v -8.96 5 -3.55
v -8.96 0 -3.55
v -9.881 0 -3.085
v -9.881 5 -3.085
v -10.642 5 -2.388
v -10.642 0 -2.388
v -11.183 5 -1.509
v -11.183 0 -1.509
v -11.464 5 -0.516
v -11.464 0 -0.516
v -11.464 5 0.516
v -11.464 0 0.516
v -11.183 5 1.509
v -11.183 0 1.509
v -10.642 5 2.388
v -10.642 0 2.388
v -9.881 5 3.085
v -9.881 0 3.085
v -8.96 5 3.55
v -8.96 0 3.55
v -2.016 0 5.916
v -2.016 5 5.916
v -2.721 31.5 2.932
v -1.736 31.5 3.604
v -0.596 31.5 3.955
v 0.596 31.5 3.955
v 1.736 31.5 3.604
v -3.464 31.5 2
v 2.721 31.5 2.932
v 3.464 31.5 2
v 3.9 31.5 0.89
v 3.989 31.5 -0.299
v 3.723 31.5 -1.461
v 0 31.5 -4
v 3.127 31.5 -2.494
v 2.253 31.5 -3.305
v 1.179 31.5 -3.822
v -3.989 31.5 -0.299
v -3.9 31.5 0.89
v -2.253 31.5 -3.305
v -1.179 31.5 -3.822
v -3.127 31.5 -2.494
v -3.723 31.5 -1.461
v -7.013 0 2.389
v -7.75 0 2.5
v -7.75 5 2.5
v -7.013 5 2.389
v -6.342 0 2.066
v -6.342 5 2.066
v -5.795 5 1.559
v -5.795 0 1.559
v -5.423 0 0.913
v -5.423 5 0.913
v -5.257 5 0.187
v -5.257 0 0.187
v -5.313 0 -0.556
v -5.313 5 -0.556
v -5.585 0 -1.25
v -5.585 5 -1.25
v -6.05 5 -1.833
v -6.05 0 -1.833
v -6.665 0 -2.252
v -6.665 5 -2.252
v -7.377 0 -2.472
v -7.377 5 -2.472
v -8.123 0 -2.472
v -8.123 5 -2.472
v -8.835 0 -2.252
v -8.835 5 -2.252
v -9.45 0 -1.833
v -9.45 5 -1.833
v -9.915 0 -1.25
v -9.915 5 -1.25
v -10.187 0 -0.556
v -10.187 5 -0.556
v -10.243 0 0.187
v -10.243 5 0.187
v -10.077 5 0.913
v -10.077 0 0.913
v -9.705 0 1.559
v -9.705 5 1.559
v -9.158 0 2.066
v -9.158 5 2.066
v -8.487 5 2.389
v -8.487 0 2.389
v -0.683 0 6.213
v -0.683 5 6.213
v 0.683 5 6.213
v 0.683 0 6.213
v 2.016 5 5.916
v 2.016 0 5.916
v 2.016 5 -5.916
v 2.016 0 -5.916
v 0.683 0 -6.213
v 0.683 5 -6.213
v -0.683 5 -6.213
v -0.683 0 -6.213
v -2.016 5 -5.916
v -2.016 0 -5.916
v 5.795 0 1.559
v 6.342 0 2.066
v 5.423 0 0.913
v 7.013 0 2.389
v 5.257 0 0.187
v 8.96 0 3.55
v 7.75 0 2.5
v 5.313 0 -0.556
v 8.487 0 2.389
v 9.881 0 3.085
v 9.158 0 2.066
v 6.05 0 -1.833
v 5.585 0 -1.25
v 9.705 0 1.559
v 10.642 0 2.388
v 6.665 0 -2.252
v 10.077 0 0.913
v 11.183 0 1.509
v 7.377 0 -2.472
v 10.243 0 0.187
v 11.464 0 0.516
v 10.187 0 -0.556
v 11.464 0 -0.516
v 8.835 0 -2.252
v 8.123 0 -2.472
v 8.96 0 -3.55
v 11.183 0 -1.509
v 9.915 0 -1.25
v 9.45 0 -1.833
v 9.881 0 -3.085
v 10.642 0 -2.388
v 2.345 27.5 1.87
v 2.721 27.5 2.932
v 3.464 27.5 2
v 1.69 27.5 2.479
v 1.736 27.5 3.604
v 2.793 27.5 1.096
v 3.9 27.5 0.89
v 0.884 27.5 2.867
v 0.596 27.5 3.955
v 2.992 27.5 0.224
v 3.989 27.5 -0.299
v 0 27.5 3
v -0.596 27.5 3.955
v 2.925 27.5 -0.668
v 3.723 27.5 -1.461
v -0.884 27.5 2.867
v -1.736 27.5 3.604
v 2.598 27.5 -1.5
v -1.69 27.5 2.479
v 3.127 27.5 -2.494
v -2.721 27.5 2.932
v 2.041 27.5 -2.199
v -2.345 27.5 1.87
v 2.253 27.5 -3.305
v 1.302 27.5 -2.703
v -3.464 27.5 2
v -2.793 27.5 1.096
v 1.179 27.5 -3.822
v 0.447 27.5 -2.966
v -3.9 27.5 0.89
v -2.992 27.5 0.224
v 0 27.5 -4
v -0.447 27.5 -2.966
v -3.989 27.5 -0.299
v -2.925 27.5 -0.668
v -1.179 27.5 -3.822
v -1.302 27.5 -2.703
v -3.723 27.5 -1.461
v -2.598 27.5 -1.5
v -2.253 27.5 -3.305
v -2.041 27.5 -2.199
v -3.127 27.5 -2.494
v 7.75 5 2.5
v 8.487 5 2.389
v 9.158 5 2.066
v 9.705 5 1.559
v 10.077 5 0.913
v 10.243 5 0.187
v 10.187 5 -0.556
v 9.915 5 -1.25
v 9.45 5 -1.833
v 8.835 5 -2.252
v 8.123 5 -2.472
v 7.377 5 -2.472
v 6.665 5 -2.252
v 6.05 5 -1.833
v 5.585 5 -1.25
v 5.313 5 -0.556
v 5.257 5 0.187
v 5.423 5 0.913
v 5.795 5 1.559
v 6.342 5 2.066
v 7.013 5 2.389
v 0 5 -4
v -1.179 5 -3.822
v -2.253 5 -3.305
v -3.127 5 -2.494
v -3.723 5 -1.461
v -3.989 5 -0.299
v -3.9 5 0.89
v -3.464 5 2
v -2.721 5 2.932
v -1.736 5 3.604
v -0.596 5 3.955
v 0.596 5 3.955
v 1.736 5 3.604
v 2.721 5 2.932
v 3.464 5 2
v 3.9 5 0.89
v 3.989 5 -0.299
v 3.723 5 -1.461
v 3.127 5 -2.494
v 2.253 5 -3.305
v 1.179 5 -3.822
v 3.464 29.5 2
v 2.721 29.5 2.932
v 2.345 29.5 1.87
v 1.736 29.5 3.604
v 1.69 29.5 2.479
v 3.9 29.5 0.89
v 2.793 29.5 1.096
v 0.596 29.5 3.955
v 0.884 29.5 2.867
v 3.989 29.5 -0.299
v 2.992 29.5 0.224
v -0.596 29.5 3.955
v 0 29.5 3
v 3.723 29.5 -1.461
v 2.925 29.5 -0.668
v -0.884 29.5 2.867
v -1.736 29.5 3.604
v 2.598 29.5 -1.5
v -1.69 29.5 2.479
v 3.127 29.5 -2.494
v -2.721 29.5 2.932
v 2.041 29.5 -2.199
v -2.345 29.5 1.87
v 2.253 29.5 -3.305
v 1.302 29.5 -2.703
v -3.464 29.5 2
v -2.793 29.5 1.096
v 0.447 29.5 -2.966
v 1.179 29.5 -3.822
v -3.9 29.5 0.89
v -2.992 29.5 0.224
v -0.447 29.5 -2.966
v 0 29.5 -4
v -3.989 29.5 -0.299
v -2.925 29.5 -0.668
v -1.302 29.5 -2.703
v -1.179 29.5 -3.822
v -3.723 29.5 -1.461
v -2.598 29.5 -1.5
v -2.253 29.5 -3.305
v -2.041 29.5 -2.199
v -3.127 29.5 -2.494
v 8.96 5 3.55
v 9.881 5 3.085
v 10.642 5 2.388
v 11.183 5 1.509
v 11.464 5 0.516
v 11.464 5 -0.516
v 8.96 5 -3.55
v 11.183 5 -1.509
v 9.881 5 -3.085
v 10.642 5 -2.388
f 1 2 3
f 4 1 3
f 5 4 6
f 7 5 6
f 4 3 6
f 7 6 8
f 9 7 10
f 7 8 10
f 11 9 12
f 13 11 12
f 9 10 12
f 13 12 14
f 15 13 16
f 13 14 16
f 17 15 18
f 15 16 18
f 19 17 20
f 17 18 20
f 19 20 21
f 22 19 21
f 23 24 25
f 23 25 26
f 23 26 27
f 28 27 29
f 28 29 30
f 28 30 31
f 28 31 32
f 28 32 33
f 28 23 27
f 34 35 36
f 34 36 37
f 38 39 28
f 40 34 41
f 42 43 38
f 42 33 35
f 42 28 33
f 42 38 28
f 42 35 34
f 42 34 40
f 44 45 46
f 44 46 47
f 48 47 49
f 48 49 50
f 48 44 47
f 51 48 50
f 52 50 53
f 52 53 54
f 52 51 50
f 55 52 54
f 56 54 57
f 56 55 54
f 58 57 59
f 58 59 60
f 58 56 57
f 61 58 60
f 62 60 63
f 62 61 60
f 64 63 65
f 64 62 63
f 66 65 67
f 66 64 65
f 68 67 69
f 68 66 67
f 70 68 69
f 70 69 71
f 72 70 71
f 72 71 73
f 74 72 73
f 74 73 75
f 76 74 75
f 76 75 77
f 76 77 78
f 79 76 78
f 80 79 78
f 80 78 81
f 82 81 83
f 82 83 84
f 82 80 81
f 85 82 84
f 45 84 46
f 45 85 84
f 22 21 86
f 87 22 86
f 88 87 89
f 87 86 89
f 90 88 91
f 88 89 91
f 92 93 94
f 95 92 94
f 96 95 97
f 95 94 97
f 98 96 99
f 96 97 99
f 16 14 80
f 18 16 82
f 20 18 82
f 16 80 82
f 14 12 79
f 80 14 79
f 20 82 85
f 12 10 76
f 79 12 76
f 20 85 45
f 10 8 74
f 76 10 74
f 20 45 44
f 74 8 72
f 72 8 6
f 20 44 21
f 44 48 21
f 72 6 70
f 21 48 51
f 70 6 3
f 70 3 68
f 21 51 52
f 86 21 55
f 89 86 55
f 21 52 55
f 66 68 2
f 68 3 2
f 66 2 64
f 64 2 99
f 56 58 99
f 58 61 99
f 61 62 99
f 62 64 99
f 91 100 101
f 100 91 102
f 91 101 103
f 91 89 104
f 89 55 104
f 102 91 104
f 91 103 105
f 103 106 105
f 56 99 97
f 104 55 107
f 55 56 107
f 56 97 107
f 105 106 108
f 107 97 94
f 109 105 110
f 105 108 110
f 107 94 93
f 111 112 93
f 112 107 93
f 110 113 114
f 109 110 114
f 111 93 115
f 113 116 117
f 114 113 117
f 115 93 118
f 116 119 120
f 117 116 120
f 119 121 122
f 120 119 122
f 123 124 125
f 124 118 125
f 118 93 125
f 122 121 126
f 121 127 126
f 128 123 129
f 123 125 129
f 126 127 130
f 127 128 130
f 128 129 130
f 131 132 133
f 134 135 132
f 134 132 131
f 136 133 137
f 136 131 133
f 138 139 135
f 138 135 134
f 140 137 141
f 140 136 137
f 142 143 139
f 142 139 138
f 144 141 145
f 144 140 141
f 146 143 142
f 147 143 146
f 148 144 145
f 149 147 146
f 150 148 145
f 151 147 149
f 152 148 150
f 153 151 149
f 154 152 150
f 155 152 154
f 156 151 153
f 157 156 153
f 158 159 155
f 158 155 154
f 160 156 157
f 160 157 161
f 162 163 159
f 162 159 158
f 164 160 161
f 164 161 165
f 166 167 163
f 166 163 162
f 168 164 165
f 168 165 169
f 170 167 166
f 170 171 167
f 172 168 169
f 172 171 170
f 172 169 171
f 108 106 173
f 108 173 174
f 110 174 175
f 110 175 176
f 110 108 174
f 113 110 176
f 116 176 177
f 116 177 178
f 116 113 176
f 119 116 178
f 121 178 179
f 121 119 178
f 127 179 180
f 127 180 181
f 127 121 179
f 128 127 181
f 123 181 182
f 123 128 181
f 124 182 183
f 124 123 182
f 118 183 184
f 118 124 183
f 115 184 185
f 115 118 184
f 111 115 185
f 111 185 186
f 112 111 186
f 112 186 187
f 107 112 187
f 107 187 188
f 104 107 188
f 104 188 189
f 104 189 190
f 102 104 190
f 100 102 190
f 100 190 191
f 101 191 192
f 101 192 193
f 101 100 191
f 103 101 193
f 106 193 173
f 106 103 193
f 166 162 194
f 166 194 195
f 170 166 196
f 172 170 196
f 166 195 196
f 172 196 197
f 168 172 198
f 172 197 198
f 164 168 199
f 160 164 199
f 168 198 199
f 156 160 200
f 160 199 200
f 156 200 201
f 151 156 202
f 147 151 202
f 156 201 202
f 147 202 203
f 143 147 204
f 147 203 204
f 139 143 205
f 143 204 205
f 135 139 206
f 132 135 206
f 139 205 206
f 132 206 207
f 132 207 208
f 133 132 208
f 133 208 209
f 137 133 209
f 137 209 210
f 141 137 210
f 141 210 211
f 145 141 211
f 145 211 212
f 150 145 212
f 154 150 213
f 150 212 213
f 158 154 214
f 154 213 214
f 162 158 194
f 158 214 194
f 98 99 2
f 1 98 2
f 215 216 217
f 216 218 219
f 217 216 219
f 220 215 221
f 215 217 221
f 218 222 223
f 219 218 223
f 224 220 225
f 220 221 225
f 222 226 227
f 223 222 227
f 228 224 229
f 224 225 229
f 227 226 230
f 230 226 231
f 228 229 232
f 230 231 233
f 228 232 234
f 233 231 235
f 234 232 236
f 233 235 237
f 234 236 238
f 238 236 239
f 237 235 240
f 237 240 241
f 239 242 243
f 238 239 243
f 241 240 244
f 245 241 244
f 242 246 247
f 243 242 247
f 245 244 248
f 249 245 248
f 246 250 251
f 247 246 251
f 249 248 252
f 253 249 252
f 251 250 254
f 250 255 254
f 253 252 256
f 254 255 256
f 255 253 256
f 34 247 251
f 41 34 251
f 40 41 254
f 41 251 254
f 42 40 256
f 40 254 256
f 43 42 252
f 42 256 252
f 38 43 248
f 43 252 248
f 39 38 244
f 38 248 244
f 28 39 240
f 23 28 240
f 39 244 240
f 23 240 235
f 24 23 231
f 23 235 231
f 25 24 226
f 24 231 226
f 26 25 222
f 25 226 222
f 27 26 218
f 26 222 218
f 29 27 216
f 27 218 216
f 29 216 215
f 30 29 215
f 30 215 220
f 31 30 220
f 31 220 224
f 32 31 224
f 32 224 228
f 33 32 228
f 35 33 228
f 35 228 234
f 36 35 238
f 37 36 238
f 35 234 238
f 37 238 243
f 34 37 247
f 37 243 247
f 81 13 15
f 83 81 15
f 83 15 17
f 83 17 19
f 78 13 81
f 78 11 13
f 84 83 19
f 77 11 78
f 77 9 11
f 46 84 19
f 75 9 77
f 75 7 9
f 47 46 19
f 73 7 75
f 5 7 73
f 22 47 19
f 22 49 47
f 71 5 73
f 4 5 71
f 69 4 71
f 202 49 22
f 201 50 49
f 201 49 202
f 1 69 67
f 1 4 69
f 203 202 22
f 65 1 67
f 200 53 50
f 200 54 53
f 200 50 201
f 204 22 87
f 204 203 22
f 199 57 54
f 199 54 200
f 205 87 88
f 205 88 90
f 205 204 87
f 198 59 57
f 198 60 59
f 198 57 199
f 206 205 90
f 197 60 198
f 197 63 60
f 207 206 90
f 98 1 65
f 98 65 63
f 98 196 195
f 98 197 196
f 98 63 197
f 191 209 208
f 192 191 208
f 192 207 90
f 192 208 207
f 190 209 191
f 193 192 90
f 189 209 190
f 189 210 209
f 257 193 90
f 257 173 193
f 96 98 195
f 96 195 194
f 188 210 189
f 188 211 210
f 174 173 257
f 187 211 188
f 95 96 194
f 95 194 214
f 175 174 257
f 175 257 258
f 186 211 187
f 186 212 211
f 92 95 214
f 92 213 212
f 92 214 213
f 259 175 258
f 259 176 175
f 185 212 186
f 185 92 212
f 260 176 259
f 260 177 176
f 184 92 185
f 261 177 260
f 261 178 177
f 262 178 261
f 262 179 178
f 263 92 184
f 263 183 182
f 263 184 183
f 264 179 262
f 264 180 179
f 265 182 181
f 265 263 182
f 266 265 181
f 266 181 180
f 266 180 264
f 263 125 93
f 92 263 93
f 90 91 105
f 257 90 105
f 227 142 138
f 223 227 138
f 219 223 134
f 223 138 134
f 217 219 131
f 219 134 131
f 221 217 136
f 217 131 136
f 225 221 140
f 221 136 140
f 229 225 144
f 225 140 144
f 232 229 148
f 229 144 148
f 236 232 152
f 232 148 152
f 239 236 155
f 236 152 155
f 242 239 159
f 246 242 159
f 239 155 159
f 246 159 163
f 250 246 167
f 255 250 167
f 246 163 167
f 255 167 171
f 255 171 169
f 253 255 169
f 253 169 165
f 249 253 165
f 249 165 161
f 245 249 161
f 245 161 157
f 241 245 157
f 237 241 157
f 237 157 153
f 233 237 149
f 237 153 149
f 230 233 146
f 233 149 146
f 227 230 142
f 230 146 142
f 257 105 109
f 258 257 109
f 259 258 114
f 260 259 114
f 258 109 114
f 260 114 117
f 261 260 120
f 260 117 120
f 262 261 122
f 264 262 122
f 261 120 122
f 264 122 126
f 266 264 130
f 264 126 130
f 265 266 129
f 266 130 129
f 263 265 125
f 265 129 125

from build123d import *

# Parameters (mm, degrees)
SKETCH1_R           = 2.5
BOSS_EXTRUDE1_DEPTH = 5
SKETCH2_R           = 4
BOSS_EXTRUDE2_DEPTH = 22.5
SKETCH3_R           = 3
BOSS_EXTRUDE3_DEPTH = 2
SKETCH4_R           = 4
BOSS_EXTRUDE4_DEPTH = 2


with BuildPart() as part:
    # Sketch1 → Boss-Extrude1 (new body)
    with BuildSketch(Plane(origin=(0, 0, 0), x_dir=(1, 0, 0), z_dir=(0, 1, 0))):
        with BuildLine():
            ThreePointArc((-2.016129032, -5.9158874), (0, -6.25), (2.016129032, -5.9158874))
            Line((2.016129032, -5.9158874), (8.959677419, -3.54953244))
            ThreePointArc((8.959677419, -3.54953244), (11.5, 0), (8.959677419, 3.54953244))
            Line((8.959677419, 3.54953244), (2.016129032, 5.9158874))
            ThreePointArc((2.016129032, 5.9158874), (0, 6.25), (-2.016129032, 5.9158874))
            Line((-2.016129032, 5.9158874), (-8.959677419, 3.54953244))
            ThreePointArc((-8.959677419, 3.54953244), (-11.5, 0), (-8.959677419, -3.54953244))
            Line((-8.959677419, -3.54953244), (-2.016129032, -5.9158874))
        make_face()
        with Locations(Location((-7.75, 0, 0), (0, 0, 270))):
            Circle(SKETCH1_R, mode=Mode.SUBTRACT)
        with Locations(Location((7.75, 0, 0), (0, 0, 270))):
            Circle(SKETCH1_R, mode=Mode.SUBTRACT)
    extrude(amount=BOSS_EXTRUDE1_DEPTH)

    # Sketch2 → Boss-Extrude2 (add)
    with BuildSketch(Plane(origin=(0, 5, 0), x_dir=(1, 0, 0), z_dir=(0, 1, 0))):
        with Locations(Location((0, 0, 0), (0, 0, 90))):
            Circle(SKETCH2_R)
    extrude(amount=BOSS_EXTRUDE2_DEPTH)

    # Sketch3 → Boss-Extrude3 (add)
    with BuildSketch(Plane(origin=(0, 27.5, 0), x_dir=(1, 0, 0), z_dir=(0, 1, 0))):
        with Locations(Location((0, 0, 0), (0, 0, 270))):
            Circle(SKETCH3_R)
    extrude(amount=BOSS_EXTRUDE3_DEPTH)

    # Sketch4 → Boss-Extrude4 (add)
    with BuildSketch(Plane(origin=(0, 29.5, 0), x_dir=(1, 0, 0), z_dir=(0, 1, 0))):
        with Locations(Location((0, 0, 0), (0, 0, 90))):
            Circle(SKETCH4_R)
    extrude(amount=BOSS_EXTRUDE4_DEPTH)


solid = part.part
